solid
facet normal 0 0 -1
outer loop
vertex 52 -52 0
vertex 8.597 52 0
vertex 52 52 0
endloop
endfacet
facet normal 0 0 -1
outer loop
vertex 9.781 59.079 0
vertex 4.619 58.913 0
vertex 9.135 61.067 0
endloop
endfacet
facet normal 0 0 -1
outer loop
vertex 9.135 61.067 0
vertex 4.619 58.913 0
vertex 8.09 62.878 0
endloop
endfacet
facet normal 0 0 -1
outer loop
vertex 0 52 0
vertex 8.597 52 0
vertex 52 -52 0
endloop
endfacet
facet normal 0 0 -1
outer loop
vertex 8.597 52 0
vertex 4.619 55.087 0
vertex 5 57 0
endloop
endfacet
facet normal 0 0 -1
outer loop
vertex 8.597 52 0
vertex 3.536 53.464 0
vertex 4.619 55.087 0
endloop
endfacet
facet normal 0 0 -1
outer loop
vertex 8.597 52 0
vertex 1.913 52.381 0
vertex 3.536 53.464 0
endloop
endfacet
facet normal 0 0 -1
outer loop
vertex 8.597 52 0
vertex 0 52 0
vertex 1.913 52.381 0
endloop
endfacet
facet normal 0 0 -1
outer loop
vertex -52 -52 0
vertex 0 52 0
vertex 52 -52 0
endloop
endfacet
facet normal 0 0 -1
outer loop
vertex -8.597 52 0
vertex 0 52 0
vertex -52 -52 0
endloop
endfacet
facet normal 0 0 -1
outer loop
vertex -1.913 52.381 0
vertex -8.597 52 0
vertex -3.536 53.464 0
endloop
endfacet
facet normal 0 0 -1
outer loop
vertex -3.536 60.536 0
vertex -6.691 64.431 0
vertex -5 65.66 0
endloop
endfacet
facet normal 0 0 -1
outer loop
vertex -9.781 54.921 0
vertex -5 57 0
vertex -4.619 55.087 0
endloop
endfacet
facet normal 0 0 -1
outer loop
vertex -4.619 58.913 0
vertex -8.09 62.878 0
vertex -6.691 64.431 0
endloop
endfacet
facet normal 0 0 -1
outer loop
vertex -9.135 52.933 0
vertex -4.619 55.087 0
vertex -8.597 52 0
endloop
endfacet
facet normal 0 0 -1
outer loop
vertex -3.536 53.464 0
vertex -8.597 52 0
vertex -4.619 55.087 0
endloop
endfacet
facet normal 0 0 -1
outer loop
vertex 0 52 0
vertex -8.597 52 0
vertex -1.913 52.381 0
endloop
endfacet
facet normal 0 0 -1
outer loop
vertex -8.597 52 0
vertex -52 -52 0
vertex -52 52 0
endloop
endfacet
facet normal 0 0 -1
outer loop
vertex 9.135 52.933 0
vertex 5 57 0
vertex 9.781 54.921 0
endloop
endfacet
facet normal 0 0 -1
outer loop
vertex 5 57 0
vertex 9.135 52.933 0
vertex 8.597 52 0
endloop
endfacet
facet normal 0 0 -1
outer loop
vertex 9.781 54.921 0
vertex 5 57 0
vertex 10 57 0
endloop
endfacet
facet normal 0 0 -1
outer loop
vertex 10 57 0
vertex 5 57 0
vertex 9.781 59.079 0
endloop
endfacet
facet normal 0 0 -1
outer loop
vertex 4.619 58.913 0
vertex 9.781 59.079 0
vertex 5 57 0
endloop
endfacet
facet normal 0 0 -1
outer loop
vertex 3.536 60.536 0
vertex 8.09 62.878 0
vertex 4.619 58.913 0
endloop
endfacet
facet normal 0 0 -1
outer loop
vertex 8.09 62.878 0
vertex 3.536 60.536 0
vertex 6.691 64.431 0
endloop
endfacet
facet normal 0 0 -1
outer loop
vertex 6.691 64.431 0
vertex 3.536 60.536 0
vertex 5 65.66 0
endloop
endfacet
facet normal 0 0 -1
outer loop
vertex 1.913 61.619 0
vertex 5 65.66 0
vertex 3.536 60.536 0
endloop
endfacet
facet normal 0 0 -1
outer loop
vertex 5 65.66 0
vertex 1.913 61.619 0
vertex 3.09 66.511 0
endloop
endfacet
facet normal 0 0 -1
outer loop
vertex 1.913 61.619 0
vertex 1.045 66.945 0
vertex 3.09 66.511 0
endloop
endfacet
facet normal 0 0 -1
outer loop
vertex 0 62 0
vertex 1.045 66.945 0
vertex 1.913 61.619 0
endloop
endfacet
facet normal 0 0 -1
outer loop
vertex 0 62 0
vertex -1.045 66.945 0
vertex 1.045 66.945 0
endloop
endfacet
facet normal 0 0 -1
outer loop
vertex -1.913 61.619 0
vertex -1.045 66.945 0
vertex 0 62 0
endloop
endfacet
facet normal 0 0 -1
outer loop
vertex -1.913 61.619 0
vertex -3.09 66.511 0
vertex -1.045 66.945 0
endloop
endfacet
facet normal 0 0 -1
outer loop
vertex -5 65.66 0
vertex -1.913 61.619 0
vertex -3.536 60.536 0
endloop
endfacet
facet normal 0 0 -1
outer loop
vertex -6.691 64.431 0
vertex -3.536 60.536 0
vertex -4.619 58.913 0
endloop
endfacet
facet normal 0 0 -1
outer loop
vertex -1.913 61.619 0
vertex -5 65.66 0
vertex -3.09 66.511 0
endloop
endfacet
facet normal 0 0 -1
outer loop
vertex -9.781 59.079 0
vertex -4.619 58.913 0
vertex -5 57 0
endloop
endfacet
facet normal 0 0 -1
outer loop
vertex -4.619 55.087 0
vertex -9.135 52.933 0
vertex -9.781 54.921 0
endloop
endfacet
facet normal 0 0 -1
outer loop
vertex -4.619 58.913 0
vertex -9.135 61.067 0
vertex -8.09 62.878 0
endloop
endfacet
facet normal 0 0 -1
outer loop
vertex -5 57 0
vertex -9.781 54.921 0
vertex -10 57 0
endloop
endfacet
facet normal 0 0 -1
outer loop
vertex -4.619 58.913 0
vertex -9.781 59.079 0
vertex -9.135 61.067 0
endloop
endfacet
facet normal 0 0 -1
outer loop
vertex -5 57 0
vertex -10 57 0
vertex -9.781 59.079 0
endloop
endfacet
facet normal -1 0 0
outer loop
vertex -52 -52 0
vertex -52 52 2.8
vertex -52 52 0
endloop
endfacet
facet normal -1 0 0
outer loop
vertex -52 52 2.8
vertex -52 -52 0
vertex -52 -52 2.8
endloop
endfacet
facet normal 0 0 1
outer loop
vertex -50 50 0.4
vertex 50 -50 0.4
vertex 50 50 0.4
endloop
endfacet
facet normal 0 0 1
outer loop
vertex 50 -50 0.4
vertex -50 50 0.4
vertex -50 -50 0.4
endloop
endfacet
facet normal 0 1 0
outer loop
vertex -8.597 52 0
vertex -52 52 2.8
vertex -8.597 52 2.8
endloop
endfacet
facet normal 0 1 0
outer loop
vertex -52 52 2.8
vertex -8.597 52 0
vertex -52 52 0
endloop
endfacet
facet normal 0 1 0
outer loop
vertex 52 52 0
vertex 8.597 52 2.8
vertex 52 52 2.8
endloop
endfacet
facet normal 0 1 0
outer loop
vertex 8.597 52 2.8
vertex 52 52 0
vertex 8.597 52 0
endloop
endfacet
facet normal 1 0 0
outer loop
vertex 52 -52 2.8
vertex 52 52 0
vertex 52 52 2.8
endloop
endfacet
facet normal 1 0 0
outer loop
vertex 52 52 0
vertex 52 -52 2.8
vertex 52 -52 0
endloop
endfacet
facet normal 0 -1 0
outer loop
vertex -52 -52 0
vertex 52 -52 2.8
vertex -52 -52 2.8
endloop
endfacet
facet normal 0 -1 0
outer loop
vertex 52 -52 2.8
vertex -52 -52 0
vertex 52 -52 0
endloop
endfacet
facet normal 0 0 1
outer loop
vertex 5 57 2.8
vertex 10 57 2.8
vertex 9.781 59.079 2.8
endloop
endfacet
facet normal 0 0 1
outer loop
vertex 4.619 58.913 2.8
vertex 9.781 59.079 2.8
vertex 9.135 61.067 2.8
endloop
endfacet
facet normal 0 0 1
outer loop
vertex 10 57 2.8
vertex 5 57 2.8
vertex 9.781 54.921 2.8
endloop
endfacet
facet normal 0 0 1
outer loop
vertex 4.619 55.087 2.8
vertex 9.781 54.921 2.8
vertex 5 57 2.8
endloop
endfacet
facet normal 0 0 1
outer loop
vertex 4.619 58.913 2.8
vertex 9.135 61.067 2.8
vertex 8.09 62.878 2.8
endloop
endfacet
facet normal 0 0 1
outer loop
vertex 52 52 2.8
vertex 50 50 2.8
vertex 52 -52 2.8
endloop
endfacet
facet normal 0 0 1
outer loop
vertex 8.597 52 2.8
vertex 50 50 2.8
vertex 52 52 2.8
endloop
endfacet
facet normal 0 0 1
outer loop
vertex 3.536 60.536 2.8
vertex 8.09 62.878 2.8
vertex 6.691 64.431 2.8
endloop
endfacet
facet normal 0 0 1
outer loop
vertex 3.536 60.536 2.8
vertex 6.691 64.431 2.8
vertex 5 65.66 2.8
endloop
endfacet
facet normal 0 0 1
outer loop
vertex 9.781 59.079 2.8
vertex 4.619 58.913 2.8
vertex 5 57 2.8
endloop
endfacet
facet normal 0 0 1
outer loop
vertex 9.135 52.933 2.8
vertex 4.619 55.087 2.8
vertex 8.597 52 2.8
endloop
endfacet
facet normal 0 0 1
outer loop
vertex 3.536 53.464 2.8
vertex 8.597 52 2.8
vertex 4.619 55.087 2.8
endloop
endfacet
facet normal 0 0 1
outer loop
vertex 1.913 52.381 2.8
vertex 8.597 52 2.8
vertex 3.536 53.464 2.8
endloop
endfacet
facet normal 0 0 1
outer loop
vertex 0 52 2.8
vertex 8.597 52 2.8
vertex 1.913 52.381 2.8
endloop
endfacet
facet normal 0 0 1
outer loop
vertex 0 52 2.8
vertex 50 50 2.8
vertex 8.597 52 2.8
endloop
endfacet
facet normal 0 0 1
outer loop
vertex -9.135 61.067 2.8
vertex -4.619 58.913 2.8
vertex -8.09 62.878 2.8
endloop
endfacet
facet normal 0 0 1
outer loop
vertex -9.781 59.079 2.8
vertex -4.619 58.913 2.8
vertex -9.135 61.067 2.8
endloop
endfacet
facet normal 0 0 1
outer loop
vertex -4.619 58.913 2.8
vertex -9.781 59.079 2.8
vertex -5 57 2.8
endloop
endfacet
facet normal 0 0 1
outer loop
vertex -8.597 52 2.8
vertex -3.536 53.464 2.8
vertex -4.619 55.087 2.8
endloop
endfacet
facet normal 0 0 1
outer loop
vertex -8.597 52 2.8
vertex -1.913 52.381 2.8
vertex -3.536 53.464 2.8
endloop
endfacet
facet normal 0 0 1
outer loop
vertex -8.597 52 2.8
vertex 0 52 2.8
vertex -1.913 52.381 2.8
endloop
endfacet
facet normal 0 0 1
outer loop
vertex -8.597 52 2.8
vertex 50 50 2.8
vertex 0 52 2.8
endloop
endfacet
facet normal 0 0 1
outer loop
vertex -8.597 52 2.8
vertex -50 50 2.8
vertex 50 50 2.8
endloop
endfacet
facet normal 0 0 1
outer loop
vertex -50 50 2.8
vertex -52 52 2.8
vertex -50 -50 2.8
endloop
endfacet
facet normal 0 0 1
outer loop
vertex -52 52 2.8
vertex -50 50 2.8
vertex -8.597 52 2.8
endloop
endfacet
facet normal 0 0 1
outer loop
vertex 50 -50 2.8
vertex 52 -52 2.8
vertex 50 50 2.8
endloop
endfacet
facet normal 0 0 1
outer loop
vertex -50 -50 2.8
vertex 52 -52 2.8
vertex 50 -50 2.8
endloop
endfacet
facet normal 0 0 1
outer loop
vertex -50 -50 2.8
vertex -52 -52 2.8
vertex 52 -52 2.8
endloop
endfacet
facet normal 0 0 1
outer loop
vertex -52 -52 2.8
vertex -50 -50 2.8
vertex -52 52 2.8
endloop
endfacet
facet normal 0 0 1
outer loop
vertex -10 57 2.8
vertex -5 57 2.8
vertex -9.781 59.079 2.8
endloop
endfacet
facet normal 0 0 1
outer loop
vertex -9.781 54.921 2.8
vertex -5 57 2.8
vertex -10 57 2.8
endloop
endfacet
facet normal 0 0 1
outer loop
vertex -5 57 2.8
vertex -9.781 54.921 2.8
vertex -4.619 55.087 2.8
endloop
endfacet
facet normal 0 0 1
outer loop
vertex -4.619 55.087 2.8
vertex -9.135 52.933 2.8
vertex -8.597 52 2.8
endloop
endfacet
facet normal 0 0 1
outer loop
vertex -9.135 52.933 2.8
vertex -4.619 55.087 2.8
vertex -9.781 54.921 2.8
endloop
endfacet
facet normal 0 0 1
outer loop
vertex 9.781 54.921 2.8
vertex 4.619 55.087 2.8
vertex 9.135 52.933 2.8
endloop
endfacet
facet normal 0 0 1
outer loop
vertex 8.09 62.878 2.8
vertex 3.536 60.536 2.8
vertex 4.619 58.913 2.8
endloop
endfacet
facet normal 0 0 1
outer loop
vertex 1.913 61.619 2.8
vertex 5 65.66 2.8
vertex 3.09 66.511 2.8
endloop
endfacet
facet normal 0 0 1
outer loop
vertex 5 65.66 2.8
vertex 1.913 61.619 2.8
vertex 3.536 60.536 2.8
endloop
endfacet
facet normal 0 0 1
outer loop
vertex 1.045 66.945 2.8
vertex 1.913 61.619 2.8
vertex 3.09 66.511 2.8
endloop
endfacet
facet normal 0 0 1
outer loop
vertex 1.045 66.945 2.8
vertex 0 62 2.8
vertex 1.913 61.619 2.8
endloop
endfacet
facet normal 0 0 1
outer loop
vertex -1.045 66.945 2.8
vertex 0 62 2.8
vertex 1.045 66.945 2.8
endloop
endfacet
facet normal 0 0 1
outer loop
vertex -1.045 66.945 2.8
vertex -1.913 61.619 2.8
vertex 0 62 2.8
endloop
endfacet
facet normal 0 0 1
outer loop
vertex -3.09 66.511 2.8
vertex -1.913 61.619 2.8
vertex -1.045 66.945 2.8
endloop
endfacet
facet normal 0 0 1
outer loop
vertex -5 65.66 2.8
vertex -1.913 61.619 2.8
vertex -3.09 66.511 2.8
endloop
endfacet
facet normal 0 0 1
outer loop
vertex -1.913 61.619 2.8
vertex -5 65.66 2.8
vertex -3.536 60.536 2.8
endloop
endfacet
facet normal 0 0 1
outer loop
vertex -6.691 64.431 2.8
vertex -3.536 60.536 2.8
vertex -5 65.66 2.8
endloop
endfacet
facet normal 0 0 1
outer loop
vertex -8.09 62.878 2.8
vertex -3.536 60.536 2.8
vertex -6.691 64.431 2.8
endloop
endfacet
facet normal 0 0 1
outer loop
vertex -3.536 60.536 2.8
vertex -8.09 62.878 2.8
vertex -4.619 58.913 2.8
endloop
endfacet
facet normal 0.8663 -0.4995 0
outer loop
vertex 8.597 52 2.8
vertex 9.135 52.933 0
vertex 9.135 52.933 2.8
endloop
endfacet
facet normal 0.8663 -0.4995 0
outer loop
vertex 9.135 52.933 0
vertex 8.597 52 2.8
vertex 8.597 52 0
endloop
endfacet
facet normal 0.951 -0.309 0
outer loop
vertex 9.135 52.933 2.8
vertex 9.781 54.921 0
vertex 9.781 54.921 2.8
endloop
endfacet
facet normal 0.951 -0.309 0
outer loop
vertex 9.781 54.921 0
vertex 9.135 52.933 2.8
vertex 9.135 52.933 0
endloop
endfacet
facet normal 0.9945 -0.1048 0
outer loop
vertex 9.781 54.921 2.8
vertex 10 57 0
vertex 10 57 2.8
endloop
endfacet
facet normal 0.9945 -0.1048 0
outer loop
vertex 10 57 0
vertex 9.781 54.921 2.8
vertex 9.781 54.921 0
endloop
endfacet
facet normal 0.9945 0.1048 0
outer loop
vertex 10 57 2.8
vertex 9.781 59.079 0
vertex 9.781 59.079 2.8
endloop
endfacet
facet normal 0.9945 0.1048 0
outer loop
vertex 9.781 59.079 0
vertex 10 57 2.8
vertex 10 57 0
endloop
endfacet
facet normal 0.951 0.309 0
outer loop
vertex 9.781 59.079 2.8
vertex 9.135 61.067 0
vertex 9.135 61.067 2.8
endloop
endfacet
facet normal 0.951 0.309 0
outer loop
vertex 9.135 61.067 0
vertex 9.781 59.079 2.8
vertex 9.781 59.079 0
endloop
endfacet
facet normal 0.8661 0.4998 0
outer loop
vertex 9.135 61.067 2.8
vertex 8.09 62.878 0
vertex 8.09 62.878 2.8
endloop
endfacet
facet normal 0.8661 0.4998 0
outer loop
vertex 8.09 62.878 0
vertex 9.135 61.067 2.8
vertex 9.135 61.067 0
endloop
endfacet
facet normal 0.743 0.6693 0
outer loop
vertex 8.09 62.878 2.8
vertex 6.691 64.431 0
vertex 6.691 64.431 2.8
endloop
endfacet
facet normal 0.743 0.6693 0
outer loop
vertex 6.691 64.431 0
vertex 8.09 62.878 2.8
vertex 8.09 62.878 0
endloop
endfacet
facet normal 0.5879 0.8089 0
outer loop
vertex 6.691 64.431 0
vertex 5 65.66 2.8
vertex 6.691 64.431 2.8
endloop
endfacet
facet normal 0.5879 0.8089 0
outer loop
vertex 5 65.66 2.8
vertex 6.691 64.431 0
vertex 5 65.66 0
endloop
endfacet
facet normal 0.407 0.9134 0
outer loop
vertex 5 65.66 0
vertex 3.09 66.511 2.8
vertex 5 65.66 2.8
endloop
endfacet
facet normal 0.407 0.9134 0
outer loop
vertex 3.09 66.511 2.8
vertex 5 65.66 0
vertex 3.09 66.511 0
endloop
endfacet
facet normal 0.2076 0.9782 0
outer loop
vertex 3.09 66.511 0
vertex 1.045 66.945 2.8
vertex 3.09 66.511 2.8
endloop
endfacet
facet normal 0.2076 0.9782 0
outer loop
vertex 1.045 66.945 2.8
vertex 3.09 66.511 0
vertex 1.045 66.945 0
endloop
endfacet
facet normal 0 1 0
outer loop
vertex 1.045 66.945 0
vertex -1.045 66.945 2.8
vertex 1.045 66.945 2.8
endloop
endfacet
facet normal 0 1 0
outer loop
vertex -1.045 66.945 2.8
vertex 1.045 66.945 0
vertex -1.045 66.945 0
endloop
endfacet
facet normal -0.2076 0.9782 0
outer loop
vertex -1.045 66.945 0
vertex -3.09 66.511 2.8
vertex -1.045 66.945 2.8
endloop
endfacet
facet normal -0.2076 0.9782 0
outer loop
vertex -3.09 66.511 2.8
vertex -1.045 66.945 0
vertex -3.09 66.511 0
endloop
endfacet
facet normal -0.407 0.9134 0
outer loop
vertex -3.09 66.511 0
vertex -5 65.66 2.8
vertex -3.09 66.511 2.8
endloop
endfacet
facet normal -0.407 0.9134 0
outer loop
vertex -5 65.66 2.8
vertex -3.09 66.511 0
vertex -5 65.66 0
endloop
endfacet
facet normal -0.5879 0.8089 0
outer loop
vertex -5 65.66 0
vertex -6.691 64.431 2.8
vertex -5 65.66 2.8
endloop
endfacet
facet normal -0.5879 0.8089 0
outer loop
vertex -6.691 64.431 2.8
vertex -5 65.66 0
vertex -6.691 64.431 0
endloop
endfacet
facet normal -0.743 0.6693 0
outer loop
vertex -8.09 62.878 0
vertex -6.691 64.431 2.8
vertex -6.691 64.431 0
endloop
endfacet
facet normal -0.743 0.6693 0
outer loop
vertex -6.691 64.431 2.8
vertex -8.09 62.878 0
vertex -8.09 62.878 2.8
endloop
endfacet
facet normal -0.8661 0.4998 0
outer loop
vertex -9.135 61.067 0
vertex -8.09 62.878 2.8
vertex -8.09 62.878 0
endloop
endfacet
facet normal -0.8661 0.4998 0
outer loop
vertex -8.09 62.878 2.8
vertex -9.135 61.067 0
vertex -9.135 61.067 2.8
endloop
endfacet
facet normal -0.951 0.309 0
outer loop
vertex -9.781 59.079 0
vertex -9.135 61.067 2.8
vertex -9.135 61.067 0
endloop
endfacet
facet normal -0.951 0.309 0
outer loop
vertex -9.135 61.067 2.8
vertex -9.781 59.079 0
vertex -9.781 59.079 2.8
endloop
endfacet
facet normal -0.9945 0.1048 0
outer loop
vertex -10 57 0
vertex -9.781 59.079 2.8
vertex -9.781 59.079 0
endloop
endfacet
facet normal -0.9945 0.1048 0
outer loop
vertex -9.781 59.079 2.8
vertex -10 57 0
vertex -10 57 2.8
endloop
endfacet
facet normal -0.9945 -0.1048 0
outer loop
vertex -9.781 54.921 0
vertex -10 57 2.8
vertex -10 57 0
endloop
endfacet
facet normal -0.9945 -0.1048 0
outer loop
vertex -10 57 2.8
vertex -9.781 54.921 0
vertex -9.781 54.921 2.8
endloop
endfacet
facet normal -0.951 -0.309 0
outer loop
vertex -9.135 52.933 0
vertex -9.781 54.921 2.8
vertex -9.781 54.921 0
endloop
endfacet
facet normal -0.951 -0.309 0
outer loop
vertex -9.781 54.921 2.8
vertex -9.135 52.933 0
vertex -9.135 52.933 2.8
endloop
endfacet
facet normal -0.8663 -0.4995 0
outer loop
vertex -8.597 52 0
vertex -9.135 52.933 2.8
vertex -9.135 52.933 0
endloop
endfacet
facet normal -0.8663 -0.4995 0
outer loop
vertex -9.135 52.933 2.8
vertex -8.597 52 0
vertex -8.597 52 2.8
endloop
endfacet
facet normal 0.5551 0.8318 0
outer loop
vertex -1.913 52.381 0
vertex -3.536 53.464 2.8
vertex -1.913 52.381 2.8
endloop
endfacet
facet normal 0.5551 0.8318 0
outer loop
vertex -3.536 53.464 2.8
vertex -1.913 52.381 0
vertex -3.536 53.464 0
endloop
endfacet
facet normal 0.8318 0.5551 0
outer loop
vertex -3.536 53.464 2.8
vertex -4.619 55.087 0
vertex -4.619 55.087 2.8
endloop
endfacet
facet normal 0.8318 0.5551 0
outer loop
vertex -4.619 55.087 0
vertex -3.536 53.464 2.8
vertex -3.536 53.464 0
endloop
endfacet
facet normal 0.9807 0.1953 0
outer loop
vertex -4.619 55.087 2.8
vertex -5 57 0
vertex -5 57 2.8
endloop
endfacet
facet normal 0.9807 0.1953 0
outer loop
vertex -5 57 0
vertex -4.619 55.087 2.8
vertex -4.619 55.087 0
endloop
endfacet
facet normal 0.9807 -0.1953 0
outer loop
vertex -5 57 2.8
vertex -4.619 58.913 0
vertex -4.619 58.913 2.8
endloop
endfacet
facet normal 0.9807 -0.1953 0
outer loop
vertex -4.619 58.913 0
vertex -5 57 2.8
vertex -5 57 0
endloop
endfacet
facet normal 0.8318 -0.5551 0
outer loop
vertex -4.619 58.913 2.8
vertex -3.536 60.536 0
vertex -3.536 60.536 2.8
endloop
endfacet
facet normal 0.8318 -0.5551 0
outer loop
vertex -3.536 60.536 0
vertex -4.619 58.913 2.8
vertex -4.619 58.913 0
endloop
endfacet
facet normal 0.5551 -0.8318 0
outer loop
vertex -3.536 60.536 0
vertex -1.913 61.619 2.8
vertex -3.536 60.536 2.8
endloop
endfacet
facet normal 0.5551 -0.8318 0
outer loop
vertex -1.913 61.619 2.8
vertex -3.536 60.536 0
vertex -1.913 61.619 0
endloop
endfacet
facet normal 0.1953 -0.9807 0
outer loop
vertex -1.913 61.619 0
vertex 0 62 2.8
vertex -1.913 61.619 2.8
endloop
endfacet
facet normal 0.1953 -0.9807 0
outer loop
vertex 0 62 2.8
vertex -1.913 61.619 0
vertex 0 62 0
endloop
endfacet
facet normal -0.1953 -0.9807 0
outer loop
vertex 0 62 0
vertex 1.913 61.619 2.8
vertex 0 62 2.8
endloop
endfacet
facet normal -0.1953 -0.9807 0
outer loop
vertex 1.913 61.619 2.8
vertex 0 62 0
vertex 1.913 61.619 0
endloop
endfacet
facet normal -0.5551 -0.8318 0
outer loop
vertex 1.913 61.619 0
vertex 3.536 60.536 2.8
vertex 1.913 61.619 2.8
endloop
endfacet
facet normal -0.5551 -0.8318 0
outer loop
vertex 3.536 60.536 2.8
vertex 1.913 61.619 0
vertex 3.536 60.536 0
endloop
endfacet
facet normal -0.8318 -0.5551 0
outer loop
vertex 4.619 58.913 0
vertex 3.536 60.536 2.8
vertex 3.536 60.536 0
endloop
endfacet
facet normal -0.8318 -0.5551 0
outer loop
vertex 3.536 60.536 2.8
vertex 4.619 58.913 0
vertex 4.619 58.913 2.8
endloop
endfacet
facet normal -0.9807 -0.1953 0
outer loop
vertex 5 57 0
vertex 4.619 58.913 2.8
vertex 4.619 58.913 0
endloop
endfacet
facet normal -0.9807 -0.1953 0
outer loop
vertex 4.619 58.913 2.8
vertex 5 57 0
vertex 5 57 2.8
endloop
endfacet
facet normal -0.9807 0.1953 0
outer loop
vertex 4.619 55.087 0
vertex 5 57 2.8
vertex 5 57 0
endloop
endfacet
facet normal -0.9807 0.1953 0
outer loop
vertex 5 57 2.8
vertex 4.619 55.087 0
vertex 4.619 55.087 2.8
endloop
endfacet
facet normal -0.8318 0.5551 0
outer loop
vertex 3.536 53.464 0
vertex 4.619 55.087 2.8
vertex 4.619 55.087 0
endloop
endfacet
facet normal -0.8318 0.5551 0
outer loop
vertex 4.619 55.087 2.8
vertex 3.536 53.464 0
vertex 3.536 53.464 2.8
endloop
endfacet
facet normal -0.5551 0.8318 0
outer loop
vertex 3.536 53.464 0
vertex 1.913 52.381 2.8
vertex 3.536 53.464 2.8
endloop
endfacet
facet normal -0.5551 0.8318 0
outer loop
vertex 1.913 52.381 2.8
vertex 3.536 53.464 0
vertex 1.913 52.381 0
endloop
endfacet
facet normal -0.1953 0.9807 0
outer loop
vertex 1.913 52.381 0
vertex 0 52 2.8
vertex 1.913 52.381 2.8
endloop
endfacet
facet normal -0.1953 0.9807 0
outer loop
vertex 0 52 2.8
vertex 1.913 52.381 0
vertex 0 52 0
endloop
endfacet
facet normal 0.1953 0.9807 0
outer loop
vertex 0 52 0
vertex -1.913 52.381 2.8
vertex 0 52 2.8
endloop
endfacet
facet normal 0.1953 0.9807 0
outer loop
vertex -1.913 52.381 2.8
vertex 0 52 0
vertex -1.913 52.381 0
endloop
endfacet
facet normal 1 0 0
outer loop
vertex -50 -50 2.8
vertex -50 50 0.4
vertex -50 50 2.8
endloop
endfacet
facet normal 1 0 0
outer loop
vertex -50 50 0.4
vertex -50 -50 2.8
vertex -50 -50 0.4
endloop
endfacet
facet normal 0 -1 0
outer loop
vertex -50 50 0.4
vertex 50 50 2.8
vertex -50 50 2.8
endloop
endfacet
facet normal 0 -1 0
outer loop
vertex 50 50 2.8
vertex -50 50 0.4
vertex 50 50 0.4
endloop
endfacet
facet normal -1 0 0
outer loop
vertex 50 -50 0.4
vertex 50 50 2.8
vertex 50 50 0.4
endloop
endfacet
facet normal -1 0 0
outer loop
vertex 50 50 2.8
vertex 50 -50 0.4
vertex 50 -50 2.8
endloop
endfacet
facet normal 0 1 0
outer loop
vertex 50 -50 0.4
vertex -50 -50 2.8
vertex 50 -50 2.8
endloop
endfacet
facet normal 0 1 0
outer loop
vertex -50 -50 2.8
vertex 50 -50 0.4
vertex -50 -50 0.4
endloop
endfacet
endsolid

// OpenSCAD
// preview[view:south, tilt:top]

/* [Image] */

// Load a 100x100 pixel image.(images will be stretched to fit) Simple photos work best. Don't forget to click the Invert Colors checkbox!
image_file = "image-surface.dat"; // [image_surface:100x100]

/* [Adjustments] */

hole_diameter = 10;

// What layer height will you slice this at?  The thinner the better.
layer_height = 0.2;

// The lower the layer height, the more layers you can use.
number_of_layers = 12; // [5:20]

/* [Hidden] */

length = 100;
width = 100;
// base (white) will always be 2 layers thick
min_layer_height = layer_height*2;
hole_radius = hole_diameter/2;
height = layer_height*number_of_layers;

union() {
  // take just the part of surface we want
  difference() {
    translate([0, 0, min_layer_height]) scale([1,1,height]) surface(file=image_file, center=true, convexity=5);
    translate([0,0,-(height+min_layer_height)]) linear_extrude(height=height+min_layer_height) square([length, width], center=true);
  }
  linear_extrude(height=layer_height*2) square([length+4, width+4], center=true);

  linear_extrude(height=height+min_layer_height){
	  difference(){
		union(){
	      square([length+4, width+4], center=true);
		  translate([0, width/2+hole_radius+2, 0])
		    circle(r=hole_radius+5);
		}
	    union(){
	      square([length, width], center=true);
		  translate([0, width/2+hole_radius+2, 0])
	        circle(r=hole_radius);
	    }
	  }
  }
}
